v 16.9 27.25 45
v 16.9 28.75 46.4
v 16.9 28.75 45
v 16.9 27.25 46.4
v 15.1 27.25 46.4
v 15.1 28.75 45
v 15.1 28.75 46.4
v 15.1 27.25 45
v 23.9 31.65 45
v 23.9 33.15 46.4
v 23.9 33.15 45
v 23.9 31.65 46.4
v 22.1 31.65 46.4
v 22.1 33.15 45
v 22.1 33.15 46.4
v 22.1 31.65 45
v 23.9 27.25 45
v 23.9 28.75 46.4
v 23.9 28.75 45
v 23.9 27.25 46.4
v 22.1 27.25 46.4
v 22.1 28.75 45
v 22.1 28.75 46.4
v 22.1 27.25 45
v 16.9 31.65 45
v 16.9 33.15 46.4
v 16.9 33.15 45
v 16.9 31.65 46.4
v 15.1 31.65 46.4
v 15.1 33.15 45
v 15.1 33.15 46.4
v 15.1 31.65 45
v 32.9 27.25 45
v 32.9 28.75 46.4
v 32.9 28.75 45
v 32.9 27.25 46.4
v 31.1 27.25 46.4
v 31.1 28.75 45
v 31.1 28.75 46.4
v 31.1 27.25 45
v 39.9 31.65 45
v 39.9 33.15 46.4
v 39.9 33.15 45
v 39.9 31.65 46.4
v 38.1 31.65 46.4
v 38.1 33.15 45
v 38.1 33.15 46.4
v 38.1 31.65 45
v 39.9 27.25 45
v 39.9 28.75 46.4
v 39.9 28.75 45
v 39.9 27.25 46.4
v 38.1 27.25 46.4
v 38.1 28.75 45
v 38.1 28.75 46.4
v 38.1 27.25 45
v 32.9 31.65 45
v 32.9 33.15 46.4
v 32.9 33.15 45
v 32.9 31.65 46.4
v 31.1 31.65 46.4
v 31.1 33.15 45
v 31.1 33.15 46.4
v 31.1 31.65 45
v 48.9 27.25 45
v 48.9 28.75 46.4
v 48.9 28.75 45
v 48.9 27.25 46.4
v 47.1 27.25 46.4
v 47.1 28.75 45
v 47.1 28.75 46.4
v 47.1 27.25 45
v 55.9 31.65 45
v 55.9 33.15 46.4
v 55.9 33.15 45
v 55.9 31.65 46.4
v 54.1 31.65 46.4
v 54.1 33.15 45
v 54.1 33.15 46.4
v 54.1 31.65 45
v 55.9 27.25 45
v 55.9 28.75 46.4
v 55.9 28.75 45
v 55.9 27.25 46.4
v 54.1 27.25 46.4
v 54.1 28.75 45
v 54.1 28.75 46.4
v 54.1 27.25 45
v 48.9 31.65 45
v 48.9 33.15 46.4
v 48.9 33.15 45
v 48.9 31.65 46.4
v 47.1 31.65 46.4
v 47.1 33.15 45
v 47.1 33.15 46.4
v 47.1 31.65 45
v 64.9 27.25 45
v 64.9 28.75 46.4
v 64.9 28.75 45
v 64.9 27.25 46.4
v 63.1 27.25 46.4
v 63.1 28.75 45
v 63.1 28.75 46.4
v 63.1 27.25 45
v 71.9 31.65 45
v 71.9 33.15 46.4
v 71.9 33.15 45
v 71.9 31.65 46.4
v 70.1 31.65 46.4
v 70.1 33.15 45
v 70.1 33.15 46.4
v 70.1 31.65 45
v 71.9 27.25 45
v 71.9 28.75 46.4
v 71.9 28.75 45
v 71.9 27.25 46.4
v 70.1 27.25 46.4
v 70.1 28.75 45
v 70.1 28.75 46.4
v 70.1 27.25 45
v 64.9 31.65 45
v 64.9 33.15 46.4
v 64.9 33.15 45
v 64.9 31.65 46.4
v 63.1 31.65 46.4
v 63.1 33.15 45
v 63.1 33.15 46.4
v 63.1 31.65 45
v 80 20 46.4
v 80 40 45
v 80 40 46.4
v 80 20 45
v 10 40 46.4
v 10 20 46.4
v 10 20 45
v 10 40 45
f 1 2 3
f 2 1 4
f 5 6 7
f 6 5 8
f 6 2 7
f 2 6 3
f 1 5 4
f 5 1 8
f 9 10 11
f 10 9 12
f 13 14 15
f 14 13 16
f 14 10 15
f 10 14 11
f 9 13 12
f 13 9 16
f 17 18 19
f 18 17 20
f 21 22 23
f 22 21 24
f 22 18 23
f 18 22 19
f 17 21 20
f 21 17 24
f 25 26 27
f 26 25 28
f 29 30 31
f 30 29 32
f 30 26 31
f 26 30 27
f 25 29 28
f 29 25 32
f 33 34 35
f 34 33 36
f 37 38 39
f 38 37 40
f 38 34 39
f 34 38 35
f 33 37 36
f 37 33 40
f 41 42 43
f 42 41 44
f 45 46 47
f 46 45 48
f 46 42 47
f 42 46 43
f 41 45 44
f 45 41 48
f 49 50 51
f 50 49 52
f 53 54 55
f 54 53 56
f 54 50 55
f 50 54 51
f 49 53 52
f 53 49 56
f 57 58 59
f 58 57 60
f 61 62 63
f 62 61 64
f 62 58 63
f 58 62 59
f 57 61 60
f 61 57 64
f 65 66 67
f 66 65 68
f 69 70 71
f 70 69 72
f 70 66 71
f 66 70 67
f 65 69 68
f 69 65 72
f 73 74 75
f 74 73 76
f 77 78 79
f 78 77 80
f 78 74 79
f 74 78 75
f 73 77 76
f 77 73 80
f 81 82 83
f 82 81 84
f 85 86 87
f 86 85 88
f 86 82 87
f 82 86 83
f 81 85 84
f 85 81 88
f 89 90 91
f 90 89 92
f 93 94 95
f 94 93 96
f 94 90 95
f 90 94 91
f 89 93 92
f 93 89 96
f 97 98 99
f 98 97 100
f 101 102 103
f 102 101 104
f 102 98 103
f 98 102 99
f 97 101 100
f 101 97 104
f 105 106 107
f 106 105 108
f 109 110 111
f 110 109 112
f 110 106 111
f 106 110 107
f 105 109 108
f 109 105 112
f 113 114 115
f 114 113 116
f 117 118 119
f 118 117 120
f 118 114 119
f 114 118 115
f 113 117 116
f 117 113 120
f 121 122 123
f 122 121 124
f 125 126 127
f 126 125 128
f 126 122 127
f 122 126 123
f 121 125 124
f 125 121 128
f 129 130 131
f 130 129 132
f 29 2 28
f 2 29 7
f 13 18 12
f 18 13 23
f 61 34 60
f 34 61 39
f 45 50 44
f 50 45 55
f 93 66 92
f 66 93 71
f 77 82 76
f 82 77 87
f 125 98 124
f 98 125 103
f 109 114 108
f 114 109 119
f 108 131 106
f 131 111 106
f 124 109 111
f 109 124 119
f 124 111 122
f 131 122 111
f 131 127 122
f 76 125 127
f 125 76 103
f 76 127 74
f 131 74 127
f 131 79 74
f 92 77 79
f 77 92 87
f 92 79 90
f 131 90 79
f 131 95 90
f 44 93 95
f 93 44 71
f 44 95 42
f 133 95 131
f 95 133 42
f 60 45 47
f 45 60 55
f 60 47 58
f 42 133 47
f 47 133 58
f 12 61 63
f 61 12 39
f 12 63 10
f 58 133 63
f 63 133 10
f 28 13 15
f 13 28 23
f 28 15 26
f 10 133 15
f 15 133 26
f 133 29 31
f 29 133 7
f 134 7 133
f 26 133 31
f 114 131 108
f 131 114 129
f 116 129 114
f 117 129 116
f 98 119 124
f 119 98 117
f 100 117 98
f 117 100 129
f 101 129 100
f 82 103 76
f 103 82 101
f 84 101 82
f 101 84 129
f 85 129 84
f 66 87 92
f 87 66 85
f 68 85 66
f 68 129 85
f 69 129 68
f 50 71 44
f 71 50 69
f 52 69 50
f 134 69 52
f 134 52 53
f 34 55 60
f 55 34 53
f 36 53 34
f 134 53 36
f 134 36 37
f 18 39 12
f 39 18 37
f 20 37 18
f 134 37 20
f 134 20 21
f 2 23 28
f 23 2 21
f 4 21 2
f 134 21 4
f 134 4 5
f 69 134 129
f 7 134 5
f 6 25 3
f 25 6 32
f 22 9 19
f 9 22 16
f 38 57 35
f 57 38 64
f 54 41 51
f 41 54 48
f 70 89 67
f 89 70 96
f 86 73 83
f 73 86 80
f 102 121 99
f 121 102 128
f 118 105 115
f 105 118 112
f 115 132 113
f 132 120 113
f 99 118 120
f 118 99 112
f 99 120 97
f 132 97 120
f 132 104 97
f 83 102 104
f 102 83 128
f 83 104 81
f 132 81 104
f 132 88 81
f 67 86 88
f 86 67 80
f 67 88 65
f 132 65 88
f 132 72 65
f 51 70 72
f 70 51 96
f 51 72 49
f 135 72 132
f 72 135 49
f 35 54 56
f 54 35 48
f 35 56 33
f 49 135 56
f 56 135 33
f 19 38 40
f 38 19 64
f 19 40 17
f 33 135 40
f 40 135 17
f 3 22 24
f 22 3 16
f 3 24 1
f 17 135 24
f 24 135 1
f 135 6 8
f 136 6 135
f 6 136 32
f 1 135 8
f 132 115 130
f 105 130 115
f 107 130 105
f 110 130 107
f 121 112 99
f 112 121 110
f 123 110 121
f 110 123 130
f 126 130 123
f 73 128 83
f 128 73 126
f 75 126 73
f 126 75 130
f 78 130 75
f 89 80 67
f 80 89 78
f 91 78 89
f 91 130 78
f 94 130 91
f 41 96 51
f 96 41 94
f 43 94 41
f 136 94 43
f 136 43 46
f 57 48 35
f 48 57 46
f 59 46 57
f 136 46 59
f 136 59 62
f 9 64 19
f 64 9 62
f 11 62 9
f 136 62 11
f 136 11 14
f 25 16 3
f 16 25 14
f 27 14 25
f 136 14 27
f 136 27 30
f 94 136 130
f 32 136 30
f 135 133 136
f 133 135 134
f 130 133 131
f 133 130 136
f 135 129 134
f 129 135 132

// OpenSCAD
/* File: swbox.scad
 * Box to hold perfboard with shift register w leds and switch header
 * Author: deh
 * Latest edit: 20191214
 */
 
 $fn = 40;
 
 // Perfboard dimensions
 pbdel = 0.5;  // A little extra
 pbx  = 80 + pbdel; 
 pby  = 40 + pbdel;
 pbz  = 1.5;  // board thickness
 pbz1 = 4.2;  // bottom to top of wiring
 
// Box 
 boxwall = 6;
 boxfloor = 4;
 boxx = pbx + boxwall*0.5;
 boxy = pby + boxwall*0.5;
 boxz = 24;
 
 // Main box cutout
 boxqx = pbx - boxwall*0.5;
 boxqy = pby - boxwall*0.5;
 
 // Switch cable cutout
 swcofx = 37;
 swcofz =  2;
 swcx = 6;
 swcz = 20;
 
 // spi cable cutout
 spiofx = 42;
 spiofz =  2;
 spix = 20;
 spiz = 10;
 
 // Post height
 pstz = boxz; // Height
 pstd = 6;  // Diameter
 paa = 1.1; // Post center offset
 
 
 module post(a)
 {
     translate (a)
     {
        translate([0,0,boxz-pstz])
        difference()
        {
            union()
            {   
                cylinder(d=pstd,h = pstz,center=false);
            }
            union()
            {
                translate([0,0,pstz-30])
                cylinder(d=2.9,h=60,center=false);
            }
        }
    }
 }
 
 module mainbox()
 {
     difference()
     {
         union()
         {
             cube ([boxx,boxy,boxz],center=false);
             post([    -paa,    -paa,0]);
             post([boxx+paa,    -paa,0]);
             post([boxx+paa,boxy+paa,0]);
             post([    -paa,boxy+paa,0]);
         }
         union()
         {
             // Main cutout
             translate([boxwall*0.5,boxwall*0.5,boxwall*0.5])
                cube([boxqx,boxqy,50],center=false);
             
             // Recess for perf board
             translate([boxwall*.25,boxwall*.25,boxz-pbz])
                cube([pbx,pby,50],center=false);
             
             // Switch cable
             swcq = boxfloor + swcofz;
             translate([boxwall*.25+swcofx,-4,swcq])
                cube([swcx,20,swcz],center=false);
             
             // spi cable
//             spiq = boxfloor + spiofz;
//             translate([boxwall*.25+spiofx,boxy-8,spiq])
//                cube([spix,30,spiz],center=false);
             
         }
     }
 }
 cvrz   = 4;      // Cover thickness
 cvrofx = 10 + boxwall*.25; // pushbutton window offset
 cvrofy = 25 + boxwall*.25; // pushbutton window offset
 cvrx   = 60;    // Length of pushbutton window
 cvry   = 10;    // Width of pushbutton window
 cvrdel = 2.5;   // Overlap a edge
 
 module cvrpost(a)
 {
     translate (a)
     {
        translate([0,0,0])
        difference()
        {
            union()
            {   
                cylinder(d=pstd,h = cvrz,center=false);
            }
            union()
            {
                translate([0,0,-.5])
                cylinder(d=3.2,h=8,center=false);
            }
        }
    }
 }
 cvrw = 1.5;
 cvrlj = 2.0;
 cvrlh = cvrz + cvrlj;
 
 module cvrlip(a,r,l)
 {
      translate (a)
     {
        translate([0,0,cvrlj])
        difference()
        {
            union()
            {   
                translate([0,0,0])
                cube([l,cvrw,cvrlh],center=true);
            }
            union()
            {
            }
        }    
    }
 }
 
 // Toggle switch hole in cover
module togglehole(a)
{
   translate(a)
    cylinder(d = 6.4, h = 20, center=true);
} 
 
 module cover(a)
 {
     translate(a)
     {
         difference()
         {
             union()
             {
                cube ([boxx,boxy,cvrz],center=false);
                cvrpost([    -paa,    -paa,0]);
                cvrpost([boxx+paa,    -paa,0]);
                cvrpost([boxx+paa,boxy+paa,0]);
                cvrpost([    -paa,boxy+paa,0]);
                 
//cvrlip([boxx/2,-cvrw,0],[0,0,0],boxx-2*boxwall-8);                 
             }
             union()
             {
                // Recess in cover
//                translate([boxwall*.25+cvrdel*.5,boxwall*.25+cvrdel*.5,0])
//                    cube([pbx-cvrdel,pby-cvrdel,cvrz-1.5],center=false);
                 
                // pushbutton plate window
                 translate([cvrofx,cvrofy,-1])
                    cube([cvrx,cvry, 30],center=false);
                
                // Holes for toggle switches
                 inc = 18; qx = (pbx - 3*inc)/2; qy = 13; 
                 togglehole([qx+(0*inc),qy,0]);
                 togglehole([qx+(1*inc),qy,0]);
                 togglehole([qx+(2*inc),qy,0]);                 
                 togglehole([qx+(3*inc),qy,0]);
             }
         }
     }
 }

 
 pinx = 7.0;    // sw pin spacing x direction
 piny = 4.4;    // sw pin spacing y direction
 
 swplatex = 10.0 ;  // width
 swplatey = 8.0;
 sidey = 15.0;
 
 pwinx = 1.8;
 pwiny = 1.5;
 
 module pbhole(a)
 {
     translate(a)
     {
        cube([pwinx,pwiny,20],center=true);
     }
 }
 module pbholes(a)
 {
     translate(a)
     {
        pbhole([   0,   0, 0]);
        pbhole([pinx,piny, 0]);
        pbhole([pinx,   0, 0]);
        pbhole([   0,piny, 0]);
     }
 }
 
pbhx = 70;
pbhy = 20;
pbhz = 1.4;
 module pbplate(a)
 {
hofx = 6;
hofy = 8;     
incx = 16;
     
     translate(a)
     {
         difference()
         {
            cube([pbhx,pbhy,pbhz],center=false);
             
            union()
            {
             pbholes([hofx+0*incx,hofy,0]);
             pbholes([hofx+1*incx,hofy,0]);
             pbholes([hofx+2*incx,hofy,0]);
             pbholes([hofx+3*incx,hofy,0]);             
            }
        }
     }
 }
 
// mainbox();
 
// rotate([180,0,0])
//   cover([0,0,35]);
 
 pbplate([10,20,45]);
